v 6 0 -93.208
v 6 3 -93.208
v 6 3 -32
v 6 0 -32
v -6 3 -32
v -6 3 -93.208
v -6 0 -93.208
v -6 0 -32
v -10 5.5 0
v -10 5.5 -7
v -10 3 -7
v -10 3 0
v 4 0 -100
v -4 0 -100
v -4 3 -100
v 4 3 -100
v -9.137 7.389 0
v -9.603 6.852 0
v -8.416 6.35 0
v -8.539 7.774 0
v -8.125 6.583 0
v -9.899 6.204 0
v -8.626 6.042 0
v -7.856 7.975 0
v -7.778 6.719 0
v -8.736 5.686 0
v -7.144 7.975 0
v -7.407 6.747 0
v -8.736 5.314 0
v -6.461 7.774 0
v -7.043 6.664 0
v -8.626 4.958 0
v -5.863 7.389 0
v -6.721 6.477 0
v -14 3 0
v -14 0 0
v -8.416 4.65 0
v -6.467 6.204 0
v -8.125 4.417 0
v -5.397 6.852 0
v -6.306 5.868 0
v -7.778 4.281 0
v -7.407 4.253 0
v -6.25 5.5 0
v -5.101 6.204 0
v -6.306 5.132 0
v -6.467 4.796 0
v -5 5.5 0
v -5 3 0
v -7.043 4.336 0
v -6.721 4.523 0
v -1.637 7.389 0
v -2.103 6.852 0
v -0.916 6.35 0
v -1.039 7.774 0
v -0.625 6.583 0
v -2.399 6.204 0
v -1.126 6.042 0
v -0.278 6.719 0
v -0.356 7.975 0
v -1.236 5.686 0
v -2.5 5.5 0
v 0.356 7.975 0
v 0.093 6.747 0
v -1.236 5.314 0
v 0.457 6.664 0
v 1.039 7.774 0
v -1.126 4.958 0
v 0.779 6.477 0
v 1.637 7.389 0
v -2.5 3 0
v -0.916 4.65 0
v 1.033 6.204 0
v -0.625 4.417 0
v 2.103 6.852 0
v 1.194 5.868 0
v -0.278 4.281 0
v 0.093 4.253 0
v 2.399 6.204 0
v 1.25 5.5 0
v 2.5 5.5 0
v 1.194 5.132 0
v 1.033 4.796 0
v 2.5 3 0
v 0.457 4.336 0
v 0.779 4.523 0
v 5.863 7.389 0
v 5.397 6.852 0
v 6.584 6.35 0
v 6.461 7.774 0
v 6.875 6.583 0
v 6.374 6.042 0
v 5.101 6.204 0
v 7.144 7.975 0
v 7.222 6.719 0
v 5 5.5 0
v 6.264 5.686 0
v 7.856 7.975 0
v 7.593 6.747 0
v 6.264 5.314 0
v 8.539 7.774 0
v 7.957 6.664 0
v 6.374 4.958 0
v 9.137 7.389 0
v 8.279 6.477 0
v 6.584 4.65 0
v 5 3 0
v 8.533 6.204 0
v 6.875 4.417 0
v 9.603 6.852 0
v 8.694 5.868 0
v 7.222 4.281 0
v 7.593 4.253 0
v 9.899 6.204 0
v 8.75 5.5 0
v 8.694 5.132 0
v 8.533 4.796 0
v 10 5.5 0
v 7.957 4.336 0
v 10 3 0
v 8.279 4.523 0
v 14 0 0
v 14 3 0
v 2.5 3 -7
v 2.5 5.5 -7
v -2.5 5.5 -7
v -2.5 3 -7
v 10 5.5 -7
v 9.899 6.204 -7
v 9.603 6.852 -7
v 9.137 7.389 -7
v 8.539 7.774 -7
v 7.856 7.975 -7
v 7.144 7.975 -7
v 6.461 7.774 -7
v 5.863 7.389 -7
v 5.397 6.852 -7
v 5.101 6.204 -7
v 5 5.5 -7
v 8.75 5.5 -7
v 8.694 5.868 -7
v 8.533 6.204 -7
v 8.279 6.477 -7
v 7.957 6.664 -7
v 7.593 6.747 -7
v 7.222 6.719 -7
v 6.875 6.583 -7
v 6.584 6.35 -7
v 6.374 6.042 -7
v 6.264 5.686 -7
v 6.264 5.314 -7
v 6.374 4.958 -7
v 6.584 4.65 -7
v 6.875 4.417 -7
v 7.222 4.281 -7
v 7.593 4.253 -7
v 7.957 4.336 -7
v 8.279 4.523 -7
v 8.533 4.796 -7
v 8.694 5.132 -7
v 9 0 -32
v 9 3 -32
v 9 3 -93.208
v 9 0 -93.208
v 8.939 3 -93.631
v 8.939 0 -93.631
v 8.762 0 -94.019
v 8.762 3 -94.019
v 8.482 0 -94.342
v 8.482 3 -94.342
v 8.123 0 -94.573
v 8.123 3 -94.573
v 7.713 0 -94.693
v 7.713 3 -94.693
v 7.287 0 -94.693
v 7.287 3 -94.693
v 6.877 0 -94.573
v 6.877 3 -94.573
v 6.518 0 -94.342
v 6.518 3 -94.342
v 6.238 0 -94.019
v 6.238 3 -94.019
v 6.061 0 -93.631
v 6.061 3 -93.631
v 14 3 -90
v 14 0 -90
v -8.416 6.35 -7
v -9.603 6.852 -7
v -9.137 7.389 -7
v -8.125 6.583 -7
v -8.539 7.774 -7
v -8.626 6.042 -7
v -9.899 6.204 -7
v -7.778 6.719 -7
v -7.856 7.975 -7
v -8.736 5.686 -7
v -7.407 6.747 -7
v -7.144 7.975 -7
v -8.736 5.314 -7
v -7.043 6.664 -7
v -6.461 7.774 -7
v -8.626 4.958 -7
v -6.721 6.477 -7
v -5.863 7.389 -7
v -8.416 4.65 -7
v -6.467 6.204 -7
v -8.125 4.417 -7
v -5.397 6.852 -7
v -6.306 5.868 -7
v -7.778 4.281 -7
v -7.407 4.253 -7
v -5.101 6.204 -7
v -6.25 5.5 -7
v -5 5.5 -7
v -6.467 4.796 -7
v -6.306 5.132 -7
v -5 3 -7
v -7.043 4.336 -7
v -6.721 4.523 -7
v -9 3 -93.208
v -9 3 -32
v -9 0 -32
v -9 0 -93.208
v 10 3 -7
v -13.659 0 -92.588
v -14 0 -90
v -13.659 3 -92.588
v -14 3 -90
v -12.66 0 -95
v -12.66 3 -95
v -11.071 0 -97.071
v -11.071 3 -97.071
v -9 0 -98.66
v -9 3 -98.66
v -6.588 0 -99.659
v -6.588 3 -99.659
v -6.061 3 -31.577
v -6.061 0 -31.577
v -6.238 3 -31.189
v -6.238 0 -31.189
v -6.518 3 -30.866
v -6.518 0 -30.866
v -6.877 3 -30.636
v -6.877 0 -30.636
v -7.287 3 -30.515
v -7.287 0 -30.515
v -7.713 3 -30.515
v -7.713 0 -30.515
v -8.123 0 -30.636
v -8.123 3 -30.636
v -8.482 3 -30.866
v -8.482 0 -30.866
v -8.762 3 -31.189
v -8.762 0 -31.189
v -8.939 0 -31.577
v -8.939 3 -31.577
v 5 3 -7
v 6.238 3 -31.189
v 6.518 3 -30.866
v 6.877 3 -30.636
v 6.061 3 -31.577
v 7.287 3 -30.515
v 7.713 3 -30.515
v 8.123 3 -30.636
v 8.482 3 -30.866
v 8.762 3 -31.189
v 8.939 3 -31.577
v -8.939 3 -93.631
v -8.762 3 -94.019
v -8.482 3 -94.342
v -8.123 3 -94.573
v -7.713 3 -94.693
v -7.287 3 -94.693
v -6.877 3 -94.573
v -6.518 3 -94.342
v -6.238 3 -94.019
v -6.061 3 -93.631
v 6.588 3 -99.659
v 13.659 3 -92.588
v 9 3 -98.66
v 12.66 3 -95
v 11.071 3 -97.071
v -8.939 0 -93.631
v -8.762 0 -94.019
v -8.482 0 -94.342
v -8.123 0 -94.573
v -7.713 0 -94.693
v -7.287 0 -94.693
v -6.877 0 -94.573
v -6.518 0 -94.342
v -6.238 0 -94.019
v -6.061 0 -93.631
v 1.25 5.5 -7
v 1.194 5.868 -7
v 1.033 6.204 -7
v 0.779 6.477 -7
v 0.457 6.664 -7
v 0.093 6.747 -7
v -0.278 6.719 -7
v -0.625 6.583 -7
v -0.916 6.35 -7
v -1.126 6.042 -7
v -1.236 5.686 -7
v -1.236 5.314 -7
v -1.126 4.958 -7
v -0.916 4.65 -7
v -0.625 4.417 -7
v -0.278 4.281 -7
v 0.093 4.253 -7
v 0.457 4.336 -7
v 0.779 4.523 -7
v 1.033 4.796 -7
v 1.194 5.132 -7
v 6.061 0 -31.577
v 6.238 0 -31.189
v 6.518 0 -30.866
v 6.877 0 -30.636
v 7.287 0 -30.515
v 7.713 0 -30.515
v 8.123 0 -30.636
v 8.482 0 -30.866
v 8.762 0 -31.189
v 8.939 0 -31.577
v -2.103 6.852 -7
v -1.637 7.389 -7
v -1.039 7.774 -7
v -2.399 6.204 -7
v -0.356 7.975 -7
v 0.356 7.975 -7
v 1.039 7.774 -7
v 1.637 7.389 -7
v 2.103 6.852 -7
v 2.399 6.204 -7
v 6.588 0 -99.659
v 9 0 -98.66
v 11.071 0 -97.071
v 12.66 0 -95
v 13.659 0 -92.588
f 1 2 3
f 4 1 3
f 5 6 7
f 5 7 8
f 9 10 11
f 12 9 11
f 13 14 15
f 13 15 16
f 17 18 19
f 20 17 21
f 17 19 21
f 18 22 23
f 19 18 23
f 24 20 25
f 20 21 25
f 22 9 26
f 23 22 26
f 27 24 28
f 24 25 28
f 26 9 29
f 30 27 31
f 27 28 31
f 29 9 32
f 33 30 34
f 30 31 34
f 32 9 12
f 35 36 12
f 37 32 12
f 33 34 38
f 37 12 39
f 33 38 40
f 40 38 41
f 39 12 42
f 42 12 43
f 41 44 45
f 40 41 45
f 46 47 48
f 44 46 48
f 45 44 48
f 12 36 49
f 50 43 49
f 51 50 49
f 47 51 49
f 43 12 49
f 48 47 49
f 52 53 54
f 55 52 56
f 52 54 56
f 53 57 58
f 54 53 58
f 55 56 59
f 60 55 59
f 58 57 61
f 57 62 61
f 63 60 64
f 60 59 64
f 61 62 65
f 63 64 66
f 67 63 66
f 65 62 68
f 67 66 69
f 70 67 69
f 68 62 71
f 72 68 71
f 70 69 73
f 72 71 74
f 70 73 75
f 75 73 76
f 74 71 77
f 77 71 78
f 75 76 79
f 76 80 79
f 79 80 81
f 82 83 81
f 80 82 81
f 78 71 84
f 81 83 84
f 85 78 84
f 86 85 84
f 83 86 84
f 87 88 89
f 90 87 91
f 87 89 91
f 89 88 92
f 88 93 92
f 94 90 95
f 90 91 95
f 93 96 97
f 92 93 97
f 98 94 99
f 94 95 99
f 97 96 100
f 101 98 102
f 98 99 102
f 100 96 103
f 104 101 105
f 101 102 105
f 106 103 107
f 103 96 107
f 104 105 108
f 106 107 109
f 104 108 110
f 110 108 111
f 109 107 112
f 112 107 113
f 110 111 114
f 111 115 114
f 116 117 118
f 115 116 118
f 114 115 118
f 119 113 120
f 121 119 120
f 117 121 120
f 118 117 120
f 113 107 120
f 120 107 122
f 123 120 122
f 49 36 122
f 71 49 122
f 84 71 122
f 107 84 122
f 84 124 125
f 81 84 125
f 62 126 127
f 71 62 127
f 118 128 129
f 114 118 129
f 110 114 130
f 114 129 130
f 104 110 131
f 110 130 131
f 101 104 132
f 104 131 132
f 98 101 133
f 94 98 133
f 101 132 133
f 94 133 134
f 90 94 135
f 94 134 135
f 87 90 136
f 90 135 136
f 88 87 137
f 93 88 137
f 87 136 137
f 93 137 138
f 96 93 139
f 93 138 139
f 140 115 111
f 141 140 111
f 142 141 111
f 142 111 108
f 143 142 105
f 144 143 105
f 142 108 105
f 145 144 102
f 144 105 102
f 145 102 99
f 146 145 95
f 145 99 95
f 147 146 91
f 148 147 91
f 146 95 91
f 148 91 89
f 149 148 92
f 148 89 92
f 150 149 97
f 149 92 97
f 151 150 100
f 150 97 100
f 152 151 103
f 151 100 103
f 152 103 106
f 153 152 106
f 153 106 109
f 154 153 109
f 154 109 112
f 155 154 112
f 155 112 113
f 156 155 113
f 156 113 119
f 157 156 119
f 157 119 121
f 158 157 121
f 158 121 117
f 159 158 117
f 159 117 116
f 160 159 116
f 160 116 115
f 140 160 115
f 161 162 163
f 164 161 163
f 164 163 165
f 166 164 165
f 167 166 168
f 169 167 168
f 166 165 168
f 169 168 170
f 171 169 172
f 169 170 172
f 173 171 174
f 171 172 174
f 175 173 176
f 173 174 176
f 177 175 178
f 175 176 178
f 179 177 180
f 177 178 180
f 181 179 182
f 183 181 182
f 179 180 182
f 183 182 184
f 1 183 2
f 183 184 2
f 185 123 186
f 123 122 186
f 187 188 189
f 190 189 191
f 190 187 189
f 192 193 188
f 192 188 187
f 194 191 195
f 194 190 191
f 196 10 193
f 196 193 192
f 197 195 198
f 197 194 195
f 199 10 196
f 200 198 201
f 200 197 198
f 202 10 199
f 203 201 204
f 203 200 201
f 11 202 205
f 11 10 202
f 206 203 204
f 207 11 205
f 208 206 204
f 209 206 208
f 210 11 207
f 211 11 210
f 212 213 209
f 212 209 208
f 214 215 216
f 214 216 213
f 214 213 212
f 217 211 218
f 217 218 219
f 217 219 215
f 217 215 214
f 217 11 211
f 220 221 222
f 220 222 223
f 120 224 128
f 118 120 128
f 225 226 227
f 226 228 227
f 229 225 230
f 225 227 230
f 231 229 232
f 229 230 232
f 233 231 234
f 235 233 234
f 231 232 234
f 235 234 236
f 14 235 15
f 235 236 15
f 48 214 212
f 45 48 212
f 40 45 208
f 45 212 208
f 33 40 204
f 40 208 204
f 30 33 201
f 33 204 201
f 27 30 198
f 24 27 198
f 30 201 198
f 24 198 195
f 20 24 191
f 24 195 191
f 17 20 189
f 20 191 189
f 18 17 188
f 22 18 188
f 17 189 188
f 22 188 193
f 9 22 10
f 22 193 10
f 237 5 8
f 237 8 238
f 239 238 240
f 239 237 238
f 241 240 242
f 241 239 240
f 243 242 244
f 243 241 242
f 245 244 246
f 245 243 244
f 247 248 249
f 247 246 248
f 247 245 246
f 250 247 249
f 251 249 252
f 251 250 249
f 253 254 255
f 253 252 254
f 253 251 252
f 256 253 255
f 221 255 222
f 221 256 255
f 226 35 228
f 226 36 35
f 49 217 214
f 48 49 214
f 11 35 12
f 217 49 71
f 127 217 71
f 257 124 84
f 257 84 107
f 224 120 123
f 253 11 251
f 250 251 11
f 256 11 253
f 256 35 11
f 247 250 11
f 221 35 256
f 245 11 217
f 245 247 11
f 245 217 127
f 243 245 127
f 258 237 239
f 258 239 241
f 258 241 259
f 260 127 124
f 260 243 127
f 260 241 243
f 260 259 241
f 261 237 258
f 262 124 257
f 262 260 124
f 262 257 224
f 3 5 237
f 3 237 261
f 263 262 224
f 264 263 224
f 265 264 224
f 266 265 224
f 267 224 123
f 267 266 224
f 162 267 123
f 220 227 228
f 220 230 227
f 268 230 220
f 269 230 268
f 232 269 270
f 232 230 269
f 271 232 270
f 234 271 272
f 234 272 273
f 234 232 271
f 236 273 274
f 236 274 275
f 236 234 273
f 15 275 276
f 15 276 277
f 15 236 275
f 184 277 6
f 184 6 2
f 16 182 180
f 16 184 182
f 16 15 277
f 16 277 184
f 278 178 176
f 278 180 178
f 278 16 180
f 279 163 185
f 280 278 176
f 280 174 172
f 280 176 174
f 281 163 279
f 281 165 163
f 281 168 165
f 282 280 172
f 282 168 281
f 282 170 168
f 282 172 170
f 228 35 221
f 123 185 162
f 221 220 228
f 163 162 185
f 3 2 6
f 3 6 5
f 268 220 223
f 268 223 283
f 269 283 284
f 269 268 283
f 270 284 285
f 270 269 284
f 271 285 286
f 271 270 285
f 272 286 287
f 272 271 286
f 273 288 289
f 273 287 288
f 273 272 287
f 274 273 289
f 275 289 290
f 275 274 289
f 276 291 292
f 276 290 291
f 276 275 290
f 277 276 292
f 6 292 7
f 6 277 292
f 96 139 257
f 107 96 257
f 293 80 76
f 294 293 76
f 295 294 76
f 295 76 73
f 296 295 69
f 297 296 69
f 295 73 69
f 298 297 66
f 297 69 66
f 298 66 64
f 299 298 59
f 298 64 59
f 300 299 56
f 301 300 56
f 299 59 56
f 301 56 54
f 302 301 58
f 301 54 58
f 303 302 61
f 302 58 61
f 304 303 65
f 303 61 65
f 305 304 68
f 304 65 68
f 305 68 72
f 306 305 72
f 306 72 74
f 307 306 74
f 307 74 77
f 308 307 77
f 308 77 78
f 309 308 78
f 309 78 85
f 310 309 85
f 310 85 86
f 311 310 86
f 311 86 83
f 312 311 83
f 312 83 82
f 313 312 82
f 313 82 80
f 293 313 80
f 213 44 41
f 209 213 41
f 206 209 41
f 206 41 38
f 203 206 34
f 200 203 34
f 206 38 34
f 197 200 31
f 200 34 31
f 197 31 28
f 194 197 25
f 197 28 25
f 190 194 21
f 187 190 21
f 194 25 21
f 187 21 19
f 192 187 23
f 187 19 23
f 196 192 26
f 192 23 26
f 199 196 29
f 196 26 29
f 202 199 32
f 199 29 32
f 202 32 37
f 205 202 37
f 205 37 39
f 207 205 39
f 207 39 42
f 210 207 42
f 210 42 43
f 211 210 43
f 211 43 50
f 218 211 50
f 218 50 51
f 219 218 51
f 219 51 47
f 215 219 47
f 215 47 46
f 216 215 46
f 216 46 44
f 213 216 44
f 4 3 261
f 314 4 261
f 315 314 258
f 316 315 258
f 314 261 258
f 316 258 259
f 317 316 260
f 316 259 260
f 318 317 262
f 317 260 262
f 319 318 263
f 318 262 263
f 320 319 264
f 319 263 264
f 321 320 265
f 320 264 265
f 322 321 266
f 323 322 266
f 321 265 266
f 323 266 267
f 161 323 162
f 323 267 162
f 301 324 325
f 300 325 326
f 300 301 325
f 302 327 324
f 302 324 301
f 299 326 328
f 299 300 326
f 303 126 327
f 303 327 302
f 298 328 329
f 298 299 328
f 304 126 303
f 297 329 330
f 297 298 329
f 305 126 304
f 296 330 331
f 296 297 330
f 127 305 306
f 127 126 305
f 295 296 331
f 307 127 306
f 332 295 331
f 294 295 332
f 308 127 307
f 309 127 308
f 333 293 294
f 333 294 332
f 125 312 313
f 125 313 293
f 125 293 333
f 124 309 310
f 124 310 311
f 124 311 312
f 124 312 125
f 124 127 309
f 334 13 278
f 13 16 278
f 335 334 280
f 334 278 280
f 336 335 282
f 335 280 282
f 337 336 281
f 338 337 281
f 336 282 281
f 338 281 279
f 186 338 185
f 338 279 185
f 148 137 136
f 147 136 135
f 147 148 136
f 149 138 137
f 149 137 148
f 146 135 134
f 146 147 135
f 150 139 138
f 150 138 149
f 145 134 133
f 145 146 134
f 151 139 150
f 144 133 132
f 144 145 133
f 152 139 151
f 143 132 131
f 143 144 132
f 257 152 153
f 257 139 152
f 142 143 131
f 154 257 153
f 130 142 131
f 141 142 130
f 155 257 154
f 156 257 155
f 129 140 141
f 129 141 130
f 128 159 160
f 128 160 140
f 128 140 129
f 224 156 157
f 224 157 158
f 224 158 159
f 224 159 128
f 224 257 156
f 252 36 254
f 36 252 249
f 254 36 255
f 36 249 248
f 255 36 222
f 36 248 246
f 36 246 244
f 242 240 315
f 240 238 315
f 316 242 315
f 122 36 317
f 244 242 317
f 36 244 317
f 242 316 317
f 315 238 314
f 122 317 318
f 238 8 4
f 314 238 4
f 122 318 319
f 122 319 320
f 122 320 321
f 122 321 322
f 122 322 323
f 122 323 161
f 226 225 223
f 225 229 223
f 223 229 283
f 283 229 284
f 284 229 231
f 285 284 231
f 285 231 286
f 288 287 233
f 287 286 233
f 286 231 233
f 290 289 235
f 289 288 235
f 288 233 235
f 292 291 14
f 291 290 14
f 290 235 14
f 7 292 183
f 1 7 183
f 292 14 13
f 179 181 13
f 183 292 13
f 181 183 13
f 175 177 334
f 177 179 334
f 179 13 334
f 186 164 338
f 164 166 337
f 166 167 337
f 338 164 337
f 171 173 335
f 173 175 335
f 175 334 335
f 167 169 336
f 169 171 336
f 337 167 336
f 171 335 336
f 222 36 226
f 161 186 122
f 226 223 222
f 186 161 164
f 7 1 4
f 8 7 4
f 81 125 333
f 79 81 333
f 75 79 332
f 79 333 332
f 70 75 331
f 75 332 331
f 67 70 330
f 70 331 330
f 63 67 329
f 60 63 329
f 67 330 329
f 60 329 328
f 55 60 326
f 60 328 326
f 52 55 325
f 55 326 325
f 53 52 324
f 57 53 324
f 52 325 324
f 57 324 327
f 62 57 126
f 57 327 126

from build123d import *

# Parameters (mm, degrees)
CROQUIS1_W              = 28
CROQUIS1_H              = 100
SALIENTE_EXTRUIR1_DEPTH = 3
CROQUIS2_W              = 28
CROQUIS2_H              = 7
SALIENTE_EXTRUIR2_DEPTH = 5
CORTAR_EXTRUIR2_REACH   = 102
CROQUIS3_R              = 1.25
CORTAR_EXTRUIR3_START   = -7
CORTAR_EXTRUIR3_DEPTH   = 7
CORTAR_EXTRUIR4_DEPTH   = 10
REDONDEO1_R             = 10


with BuildPart() as part:
    # Croquis1 → Saliente-Extruir1 (new body)
    with BuildSketch(Plane(origin=(0, 0, 0), x_dir=(1, 0, 0), z_dir=(0, 1, 0))):
        with Locations((0, 50)):
            Rectangle(CROQUIS1_W, CROQUIS1_H)
    extrude(amount=SALIENTE_EXTRUIR1_DEPTH)

    # Croquis2 → Saliente-Extruir2 (add)
    with BuildSketch(Plane(origin=(0, 3, 0), x_dir=(1, 0, 0), z_dir=(0, 1, 0))):
        with Locations((0, 3.5)):
            Rectangle(CROQUIS2_W, CROQUIS2_H)
    extrude(amount=SALIENTE_EXTRUIR2_DEPTH)

    # Croquis3 → Cortar-Extruir2 (cut, up to next)
    with BuildSketch(Plane.XY, mode=Mode.PRIVATE) as cortar_extruir2_sk1:
        with Locations((-7.5, 5.5)):
            Circle(CROQUIS3_R)
    cortar_extruir2_tool1 = extrude(cortar_extruir2_sk1.sketch, amount=-CORTAR_EXTRUIR2_REACH, mode=Mode.PRIVATE) & part.part
    add(cortar_extruir2_tool1.solids().sort_by_distance((-7.5, 5.5, 0))[0], mode=Mode.SUBTRACT)
    # Croquis3 → Cortar-Extruir2 (cut, up to next)
    with BuildSketch(Plane.XY, mode=Mode.PRIVATE) as cortar_extruir2_sk2:
        with Locations((0, 5.5)):
            Circle(CROQUIS3_R)
    cortar_extruir2_tool2 = extrude(cortar_extruir2_sk2.sketch, amount=-CORTAR_EXTRUIR2_REACH, mode=Mode.PRIVATE) & part.part
    add(cortar_extruir2_tool2.solids().sort_by_distance((0, 5.5, 0))[0], mode=Mode.SUBTRACT)
    # Croquis3 → Cortar-Extruir2 (cut, up to next)
    with BuildSketch(Plane.XY, mode=Mode.PRIVATE) as cortar_extruir2_sk3:
        with Locations((7.5, 5.5)):
            Circle(CROQUIS3_R)
    cortar_extruir2_tool3 = extrude(cortar_extruir2_sk3.sketch, amount=-CORTAR_EXTRUIR2_REACH, mode=Mode.PRIVATE) & part.part
    add(cortar_extruir2_tool3.solids().sort_by_distance((7.5, 5.5, 0))[0], mode=Mode.SUBTRACT)

    # Croquis4 → Cortar-Extruir3 (cut)
    with BuildSketch(Plane.XY.offset(CORTAR_EXTRUIR3_START)):
        with BuildLine():
            Line((-10, 3), (-14, 3))
            Line((-14, 3), (-14, 8))
            Line((-14, 8), (-14, 10.200483226))
            Line((-14, 10.200483226), (14, 10.200483226))
            Line((14, 10.200483226), (14, 8))
            Line((14, 8), (14, 3))
            Line((14, 3), (10, 3))
            Line((10, 3), (10, 5.5))
            ThreePointArc((10, 5.5), (7.5, 8), (5, 5.5))
            Line((5, 5.5), (5, 3))
            Line((5, 3), (2.5, 3))
            Line((2.5, 3), (2.5, 5.5))
            ThreePointArc((2.5, 5.5), (0, 8), (-2.5, 5.5))
            Line((-2.5, 5.5), (-2.5, 3))
            Line((-2.5, 3), (-5, 3))
            Line((-5, 3), (-5, 5.5))
            ThreePointArc((-5, 5.5), (-7.5, 8), (-10, 5.5))
            Line((-10, 5.5), (-10, 3))
        make_face()
    extrude(amount=CORTAR_EXTRUIR3_DEPTH, mode=Mode.SUBTRACT)

    # Croquis5 → Cortar-Extruir4 (cut)
    with BuildSketch(Plane(origin=(0, 3, 0), x_dir=(1, 0, 0), z_dir=(0, 1, 0))):
        with BuildLine():
            Line((-9, 32), (-9, 93.208471881))
            ThreePointArc((-9, 93.208471881), (-7.5, 94.708471881), (-6, 93.208471881))
            Line((-6, 93.208471881), (-6, 32))
            ThreePointArc((-6, 32), (-7.5, 30.5), (-9, 32))
        make_face()
        with BuildLine():
            Line((9, 32), (9, 93.208471881))
            ThreePointArc((9, 93.208471881), (7.5, 94.708471881), (6, 93.208471881))
            Line((6, 93.208471881), (6, 32))
            ThreePointArc((6, 32), (7.5, 30.5), (9, 32))
        make_face()
    extrude(amount=-CORTAR_EXTRUIR4_DEPTH, mode=Mode.SUBTRACT)

    # Redondeo1
    redondeo1_edges = [part.edges().sort_by_distance(p)[0] for p in [
        (-14, 1.5, -100),
        (14, 1.5, -100),
    ]]
    fillet(redondeo1_edges, radius=REDONDEO1_R)


solid = part.part
